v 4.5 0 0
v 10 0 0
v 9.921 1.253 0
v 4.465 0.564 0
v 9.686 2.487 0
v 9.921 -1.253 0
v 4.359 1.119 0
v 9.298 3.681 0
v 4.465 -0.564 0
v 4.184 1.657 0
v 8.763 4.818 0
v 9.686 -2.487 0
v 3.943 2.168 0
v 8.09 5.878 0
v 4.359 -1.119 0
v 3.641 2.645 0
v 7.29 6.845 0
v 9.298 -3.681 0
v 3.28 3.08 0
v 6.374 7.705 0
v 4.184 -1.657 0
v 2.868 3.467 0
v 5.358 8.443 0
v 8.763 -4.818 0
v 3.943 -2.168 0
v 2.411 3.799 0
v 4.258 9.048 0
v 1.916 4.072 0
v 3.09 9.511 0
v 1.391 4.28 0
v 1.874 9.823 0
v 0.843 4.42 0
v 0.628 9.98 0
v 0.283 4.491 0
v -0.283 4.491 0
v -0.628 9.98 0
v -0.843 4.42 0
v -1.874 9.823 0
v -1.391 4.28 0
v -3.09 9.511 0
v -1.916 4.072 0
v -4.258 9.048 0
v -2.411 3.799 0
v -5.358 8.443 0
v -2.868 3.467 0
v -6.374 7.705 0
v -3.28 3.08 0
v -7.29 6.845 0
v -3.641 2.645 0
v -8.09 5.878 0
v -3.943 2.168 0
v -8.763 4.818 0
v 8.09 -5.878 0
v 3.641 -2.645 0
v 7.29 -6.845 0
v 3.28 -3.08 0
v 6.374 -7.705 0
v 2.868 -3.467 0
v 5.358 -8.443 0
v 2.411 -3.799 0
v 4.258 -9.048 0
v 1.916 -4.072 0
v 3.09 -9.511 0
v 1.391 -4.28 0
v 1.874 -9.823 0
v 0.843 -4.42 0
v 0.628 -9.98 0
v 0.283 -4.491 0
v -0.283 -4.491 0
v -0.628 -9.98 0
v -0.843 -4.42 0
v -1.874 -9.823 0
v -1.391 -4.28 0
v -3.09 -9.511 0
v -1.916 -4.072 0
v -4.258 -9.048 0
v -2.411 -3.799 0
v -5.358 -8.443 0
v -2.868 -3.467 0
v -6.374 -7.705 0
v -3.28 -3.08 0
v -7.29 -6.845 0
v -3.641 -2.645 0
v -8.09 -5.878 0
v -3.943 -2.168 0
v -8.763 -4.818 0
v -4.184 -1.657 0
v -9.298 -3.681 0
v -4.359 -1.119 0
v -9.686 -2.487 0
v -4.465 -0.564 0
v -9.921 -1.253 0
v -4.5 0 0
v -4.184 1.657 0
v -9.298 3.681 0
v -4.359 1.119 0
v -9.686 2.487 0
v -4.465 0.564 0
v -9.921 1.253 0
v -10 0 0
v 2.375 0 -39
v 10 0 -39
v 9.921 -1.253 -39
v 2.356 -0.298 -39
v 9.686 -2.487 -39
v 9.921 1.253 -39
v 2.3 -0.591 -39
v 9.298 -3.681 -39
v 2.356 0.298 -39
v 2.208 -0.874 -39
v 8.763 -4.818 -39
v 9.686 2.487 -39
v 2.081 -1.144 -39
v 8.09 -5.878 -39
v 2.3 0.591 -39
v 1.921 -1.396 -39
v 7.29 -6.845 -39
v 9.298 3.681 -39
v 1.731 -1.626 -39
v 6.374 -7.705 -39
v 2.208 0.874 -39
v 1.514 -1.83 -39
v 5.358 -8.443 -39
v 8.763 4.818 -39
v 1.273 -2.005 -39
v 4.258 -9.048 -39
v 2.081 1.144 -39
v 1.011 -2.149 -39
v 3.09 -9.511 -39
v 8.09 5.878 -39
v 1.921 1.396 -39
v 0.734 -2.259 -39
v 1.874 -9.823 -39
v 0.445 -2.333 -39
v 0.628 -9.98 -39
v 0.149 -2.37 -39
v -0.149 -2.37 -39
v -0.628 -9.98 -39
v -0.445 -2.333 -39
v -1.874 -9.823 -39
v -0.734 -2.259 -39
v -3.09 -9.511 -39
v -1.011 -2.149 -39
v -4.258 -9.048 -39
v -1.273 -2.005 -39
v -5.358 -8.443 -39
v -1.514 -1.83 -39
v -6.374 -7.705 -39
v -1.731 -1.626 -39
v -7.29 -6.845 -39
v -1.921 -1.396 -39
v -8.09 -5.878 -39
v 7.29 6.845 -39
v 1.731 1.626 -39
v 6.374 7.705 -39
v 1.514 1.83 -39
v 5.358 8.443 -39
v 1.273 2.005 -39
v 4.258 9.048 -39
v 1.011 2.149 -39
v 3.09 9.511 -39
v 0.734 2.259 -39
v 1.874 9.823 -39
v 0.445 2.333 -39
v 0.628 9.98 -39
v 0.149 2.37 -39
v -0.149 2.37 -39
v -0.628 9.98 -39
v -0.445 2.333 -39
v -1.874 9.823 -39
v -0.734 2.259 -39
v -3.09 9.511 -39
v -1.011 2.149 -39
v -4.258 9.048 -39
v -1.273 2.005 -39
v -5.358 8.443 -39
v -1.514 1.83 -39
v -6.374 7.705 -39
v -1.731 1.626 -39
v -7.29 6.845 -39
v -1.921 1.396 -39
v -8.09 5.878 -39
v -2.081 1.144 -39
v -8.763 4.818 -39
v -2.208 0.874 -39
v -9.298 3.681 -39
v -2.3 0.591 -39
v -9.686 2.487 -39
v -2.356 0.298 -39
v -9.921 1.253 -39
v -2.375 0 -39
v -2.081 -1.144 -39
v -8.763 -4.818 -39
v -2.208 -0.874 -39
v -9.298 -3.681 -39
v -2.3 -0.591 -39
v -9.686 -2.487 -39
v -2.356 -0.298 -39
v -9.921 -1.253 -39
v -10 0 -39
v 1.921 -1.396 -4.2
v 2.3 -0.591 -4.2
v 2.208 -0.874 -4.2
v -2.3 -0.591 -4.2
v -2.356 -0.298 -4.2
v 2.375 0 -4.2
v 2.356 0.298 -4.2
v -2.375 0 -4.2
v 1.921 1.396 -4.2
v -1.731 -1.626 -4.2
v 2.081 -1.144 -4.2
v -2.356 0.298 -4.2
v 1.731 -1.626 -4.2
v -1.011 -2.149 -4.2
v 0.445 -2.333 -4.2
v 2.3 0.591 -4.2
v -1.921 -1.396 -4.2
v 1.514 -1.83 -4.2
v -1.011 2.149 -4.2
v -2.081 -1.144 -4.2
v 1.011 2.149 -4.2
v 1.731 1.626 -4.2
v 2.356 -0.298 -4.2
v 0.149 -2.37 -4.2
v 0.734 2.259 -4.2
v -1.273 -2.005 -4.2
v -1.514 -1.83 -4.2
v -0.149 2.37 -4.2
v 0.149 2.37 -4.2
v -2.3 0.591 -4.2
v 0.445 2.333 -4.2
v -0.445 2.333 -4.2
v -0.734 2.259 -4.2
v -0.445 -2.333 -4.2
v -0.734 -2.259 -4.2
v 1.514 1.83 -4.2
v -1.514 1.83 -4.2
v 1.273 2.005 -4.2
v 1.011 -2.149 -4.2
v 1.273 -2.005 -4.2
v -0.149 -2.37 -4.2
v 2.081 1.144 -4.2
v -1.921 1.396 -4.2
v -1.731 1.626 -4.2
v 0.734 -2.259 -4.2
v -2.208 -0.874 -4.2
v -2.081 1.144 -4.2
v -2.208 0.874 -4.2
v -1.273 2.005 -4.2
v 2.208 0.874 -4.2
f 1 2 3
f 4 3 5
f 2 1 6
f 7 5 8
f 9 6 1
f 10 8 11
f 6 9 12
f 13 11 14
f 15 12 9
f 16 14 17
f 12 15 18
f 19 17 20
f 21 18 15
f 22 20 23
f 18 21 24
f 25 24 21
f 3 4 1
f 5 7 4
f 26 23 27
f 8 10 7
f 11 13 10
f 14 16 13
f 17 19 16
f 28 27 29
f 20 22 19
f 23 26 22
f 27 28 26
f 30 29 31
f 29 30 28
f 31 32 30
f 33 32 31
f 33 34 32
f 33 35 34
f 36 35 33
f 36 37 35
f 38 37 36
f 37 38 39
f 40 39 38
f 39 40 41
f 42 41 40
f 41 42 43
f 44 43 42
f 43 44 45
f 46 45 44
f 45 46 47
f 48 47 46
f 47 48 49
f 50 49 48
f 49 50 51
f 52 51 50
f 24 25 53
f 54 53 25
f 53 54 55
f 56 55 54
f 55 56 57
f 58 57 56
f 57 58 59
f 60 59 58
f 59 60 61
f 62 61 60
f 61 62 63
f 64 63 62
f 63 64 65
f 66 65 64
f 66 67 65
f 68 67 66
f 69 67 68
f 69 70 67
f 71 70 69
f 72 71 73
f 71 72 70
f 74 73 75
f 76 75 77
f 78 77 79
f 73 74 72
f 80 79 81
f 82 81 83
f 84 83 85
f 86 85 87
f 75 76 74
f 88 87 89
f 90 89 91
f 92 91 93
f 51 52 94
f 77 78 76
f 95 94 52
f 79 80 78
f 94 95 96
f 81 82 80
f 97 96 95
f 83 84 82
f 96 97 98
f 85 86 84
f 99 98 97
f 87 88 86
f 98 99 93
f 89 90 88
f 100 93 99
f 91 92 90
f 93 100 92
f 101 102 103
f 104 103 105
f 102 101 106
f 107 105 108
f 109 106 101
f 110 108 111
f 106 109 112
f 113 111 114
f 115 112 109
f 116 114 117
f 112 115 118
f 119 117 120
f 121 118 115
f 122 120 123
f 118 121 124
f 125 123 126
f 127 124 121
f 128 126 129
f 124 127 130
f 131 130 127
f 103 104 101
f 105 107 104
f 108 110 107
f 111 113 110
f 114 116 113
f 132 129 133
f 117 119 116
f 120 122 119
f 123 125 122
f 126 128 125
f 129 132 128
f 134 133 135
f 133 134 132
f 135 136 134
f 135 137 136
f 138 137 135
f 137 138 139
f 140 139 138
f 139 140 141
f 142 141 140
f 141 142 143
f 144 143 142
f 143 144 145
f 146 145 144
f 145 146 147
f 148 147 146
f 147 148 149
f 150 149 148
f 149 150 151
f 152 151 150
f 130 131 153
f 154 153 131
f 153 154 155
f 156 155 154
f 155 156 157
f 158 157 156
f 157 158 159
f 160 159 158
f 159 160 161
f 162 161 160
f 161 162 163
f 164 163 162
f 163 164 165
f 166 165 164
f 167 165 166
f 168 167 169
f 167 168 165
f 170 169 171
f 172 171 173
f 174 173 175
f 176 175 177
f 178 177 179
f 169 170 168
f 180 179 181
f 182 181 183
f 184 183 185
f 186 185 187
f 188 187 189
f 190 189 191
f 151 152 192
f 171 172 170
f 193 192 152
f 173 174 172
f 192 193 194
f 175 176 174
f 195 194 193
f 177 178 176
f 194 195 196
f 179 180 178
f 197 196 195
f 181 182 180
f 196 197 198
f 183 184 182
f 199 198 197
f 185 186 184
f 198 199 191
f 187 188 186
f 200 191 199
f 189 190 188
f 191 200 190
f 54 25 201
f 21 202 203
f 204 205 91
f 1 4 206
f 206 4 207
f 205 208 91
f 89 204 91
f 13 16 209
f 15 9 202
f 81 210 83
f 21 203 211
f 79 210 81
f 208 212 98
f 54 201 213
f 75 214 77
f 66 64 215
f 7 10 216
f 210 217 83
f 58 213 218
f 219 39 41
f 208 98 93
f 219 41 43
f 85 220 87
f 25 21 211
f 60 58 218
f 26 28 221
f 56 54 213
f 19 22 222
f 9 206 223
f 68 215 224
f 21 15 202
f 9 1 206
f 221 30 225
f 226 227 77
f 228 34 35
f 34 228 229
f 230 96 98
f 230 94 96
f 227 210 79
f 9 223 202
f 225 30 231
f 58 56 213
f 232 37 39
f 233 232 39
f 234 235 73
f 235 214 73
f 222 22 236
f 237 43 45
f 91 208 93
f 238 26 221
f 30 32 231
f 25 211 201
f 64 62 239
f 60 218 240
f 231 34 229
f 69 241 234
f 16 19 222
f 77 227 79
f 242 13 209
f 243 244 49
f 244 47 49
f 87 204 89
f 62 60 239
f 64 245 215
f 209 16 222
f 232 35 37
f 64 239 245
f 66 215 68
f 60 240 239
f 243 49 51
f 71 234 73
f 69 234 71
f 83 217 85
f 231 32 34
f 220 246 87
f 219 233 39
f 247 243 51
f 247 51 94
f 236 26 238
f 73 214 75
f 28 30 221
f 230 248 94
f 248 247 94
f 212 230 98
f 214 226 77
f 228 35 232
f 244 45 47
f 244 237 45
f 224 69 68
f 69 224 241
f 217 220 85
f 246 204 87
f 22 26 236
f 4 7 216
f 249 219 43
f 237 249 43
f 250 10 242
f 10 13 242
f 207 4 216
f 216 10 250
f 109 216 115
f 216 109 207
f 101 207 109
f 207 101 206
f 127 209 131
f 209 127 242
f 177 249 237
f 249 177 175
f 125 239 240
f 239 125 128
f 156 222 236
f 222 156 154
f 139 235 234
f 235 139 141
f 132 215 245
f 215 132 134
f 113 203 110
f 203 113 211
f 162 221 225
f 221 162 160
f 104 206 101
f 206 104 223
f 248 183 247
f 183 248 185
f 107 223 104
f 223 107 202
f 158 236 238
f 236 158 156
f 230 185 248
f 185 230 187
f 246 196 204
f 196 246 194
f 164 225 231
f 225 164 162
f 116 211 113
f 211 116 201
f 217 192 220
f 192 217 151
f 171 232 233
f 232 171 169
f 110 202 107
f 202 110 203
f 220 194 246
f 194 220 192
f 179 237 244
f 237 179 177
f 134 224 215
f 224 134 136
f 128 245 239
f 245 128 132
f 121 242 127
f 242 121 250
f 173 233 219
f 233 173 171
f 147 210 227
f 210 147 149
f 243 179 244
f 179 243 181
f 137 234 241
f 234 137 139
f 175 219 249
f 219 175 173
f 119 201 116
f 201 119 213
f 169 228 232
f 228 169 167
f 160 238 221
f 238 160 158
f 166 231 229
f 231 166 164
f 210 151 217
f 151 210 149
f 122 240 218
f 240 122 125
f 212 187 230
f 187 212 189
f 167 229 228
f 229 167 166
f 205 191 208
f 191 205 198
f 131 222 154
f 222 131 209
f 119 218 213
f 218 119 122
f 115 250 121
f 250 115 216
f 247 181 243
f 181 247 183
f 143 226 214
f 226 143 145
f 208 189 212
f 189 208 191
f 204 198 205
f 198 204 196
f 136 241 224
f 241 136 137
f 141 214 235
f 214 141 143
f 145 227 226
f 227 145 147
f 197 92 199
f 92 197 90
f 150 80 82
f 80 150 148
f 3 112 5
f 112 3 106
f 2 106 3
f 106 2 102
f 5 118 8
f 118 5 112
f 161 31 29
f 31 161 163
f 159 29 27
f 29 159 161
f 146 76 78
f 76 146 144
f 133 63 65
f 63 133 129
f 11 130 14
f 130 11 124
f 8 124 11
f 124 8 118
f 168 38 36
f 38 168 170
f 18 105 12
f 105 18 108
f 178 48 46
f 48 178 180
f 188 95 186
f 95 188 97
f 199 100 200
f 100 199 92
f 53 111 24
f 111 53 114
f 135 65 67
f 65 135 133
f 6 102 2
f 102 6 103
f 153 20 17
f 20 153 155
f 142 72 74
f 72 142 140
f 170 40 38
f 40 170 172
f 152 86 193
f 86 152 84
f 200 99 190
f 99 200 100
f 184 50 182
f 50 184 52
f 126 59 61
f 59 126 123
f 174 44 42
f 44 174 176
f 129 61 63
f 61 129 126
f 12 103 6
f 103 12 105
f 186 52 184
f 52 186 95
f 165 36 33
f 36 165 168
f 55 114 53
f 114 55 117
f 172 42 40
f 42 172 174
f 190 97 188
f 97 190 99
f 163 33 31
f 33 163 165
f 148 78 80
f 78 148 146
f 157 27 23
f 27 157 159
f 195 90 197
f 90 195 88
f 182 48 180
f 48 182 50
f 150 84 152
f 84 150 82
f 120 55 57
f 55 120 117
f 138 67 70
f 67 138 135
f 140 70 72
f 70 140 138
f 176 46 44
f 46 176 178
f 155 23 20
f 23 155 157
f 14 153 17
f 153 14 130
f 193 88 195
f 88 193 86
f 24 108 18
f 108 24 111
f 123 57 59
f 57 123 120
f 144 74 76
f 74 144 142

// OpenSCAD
$fn = 50;


difference() {
	union() {
		translate(v = [0, 0, -39.0000000000]) {
			cylinder(h = 39, r = 10.0000000000);
		}
		cylinder(h = 0, r = 20.0000000000);
	}
	union() {
		translate(v = [0, 0, 0]) {
			rotate(a = [0, 0, 0]) {
				difference() {
					union() {
						#translate(v = [0, 0, -39.0000000000]) {
							cylinder(h = 39, r = 2.2500000000);
						}
						#translate(v = [0, 0, -4.2000000000]) {
							cylinder(h = 4.2000000000, r1 = 2.3750000000, r2 = 4.5000000000);
						}
						#translate(v = [0, 0, -39.0000000000]) {
							cylinder(h = 39, r = 2.3750000000);
						}
						#translate(v = [0, 0, -39.0000000000]) {
							cylinder(h = 39, r = 2.2500000000);
						}
					}
					union();
				}
			}
		}
	}
}
